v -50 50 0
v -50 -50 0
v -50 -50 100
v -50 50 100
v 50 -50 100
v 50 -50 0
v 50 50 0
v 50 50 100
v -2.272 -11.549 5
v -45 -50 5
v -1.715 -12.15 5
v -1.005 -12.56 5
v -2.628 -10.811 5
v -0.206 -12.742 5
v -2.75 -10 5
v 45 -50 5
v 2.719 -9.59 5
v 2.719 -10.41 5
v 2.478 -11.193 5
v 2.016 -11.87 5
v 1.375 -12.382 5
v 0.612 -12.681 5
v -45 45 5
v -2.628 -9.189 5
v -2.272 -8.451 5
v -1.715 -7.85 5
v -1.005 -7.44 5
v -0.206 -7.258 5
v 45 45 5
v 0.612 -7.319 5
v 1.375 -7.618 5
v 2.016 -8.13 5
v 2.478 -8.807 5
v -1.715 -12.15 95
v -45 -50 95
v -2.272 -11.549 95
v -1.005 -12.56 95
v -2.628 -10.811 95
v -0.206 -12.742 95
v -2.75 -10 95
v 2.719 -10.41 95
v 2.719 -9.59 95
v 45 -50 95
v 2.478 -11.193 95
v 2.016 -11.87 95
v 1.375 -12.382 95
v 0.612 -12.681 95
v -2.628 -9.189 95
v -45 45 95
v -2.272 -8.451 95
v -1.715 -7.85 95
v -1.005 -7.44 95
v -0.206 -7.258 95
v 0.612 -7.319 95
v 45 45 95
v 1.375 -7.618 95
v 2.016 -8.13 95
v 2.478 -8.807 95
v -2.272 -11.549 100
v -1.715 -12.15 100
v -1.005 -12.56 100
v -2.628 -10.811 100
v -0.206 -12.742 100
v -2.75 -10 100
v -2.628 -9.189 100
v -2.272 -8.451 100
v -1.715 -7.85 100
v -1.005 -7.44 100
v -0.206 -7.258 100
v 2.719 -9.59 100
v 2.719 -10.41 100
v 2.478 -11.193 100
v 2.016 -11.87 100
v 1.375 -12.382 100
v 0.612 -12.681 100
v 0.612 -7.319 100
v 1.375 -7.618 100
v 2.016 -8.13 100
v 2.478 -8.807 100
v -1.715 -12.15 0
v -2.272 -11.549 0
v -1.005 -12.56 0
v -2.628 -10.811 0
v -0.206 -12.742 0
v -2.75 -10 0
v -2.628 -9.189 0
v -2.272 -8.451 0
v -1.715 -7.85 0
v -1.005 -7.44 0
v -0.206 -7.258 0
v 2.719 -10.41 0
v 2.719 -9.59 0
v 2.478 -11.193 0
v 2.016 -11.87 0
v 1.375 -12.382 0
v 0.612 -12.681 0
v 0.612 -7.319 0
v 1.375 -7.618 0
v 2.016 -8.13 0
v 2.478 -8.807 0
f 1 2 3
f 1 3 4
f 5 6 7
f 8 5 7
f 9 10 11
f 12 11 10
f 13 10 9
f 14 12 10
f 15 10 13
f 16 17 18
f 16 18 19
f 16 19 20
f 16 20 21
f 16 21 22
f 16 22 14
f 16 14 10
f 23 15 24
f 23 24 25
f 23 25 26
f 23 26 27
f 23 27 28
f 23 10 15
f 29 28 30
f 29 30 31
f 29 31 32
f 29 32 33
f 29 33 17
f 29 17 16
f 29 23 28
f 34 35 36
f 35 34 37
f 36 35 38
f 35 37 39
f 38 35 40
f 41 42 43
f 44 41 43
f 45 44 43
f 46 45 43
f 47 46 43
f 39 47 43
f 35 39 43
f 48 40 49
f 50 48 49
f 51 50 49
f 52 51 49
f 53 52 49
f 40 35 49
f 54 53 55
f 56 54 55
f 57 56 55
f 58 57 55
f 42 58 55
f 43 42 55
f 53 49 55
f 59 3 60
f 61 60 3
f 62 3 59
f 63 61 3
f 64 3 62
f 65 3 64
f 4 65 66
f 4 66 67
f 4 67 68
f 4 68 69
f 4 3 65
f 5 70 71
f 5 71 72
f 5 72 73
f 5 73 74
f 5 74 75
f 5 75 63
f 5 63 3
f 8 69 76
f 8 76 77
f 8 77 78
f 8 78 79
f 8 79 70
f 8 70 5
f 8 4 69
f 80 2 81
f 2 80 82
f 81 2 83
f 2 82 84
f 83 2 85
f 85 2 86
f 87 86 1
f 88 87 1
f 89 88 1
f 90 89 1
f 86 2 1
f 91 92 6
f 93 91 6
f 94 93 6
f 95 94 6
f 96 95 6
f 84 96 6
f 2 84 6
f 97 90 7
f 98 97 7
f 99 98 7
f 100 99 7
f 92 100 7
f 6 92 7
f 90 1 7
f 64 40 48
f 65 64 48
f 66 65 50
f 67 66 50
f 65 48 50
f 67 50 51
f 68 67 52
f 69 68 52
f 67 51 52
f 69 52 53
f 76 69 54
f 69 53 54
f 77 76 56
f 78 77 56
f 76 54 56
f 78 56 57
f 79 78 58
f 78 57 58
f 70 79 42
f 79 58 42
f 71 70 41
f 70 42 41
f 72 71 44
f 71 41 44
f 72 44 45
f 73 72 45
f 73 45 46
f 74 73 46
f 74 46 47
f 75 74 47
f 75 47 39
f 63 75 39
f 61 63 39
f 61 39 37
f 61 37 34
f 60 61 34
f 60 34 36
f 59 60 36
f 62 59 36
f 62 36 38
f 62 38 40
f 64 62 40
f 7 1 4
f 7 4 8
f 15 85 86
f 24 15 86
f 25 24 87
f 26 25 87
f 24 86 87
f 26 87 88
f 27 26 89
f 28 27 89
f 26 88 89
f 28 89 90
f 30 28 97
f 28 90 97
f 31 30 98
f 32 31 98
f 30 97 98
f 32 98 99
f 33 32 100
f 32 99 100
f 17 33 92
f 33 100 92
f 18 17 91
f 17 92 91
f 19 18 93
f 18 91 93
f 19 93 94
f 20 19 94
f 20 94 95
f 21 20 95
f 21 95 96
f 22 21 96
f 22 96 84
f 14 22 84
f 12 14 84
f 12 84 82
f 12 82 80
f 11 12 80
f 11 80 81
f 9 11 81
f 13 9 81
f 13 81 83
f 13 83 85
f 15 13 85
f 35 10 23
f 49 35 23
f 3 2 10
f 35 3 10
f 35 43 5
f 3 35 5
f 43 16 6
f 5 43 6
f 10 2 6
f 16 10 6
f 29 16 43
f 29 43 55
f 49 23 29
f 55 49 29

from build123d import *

# Parameters (mm, degrees)
F0_W     = 100
F0_H     = 100
F1_DEPTH = 100
F2_T     = -5
F4_D     = 5.5


with BuildPart() as f1:
    # F0 (on Top) → F1 (new body)
    with BuildSketch(Plane.XY):
        Rectangle(F0_W, F0_H)
    extrude(amount=F1_DEPTH)

    # F2
    f2_openings = [f1.faces().sort_by_distance(p)[0] for p in [
        (0, -50, 50),
    ]]
    offset(amount=F2_T, openings=f2_openings)

    # F4 (through all)
    with Locations(Plane.XY.offset(100)):
        with Locations((0, -10)):
            Hole(F4_D / 2)


solid = f1.part
